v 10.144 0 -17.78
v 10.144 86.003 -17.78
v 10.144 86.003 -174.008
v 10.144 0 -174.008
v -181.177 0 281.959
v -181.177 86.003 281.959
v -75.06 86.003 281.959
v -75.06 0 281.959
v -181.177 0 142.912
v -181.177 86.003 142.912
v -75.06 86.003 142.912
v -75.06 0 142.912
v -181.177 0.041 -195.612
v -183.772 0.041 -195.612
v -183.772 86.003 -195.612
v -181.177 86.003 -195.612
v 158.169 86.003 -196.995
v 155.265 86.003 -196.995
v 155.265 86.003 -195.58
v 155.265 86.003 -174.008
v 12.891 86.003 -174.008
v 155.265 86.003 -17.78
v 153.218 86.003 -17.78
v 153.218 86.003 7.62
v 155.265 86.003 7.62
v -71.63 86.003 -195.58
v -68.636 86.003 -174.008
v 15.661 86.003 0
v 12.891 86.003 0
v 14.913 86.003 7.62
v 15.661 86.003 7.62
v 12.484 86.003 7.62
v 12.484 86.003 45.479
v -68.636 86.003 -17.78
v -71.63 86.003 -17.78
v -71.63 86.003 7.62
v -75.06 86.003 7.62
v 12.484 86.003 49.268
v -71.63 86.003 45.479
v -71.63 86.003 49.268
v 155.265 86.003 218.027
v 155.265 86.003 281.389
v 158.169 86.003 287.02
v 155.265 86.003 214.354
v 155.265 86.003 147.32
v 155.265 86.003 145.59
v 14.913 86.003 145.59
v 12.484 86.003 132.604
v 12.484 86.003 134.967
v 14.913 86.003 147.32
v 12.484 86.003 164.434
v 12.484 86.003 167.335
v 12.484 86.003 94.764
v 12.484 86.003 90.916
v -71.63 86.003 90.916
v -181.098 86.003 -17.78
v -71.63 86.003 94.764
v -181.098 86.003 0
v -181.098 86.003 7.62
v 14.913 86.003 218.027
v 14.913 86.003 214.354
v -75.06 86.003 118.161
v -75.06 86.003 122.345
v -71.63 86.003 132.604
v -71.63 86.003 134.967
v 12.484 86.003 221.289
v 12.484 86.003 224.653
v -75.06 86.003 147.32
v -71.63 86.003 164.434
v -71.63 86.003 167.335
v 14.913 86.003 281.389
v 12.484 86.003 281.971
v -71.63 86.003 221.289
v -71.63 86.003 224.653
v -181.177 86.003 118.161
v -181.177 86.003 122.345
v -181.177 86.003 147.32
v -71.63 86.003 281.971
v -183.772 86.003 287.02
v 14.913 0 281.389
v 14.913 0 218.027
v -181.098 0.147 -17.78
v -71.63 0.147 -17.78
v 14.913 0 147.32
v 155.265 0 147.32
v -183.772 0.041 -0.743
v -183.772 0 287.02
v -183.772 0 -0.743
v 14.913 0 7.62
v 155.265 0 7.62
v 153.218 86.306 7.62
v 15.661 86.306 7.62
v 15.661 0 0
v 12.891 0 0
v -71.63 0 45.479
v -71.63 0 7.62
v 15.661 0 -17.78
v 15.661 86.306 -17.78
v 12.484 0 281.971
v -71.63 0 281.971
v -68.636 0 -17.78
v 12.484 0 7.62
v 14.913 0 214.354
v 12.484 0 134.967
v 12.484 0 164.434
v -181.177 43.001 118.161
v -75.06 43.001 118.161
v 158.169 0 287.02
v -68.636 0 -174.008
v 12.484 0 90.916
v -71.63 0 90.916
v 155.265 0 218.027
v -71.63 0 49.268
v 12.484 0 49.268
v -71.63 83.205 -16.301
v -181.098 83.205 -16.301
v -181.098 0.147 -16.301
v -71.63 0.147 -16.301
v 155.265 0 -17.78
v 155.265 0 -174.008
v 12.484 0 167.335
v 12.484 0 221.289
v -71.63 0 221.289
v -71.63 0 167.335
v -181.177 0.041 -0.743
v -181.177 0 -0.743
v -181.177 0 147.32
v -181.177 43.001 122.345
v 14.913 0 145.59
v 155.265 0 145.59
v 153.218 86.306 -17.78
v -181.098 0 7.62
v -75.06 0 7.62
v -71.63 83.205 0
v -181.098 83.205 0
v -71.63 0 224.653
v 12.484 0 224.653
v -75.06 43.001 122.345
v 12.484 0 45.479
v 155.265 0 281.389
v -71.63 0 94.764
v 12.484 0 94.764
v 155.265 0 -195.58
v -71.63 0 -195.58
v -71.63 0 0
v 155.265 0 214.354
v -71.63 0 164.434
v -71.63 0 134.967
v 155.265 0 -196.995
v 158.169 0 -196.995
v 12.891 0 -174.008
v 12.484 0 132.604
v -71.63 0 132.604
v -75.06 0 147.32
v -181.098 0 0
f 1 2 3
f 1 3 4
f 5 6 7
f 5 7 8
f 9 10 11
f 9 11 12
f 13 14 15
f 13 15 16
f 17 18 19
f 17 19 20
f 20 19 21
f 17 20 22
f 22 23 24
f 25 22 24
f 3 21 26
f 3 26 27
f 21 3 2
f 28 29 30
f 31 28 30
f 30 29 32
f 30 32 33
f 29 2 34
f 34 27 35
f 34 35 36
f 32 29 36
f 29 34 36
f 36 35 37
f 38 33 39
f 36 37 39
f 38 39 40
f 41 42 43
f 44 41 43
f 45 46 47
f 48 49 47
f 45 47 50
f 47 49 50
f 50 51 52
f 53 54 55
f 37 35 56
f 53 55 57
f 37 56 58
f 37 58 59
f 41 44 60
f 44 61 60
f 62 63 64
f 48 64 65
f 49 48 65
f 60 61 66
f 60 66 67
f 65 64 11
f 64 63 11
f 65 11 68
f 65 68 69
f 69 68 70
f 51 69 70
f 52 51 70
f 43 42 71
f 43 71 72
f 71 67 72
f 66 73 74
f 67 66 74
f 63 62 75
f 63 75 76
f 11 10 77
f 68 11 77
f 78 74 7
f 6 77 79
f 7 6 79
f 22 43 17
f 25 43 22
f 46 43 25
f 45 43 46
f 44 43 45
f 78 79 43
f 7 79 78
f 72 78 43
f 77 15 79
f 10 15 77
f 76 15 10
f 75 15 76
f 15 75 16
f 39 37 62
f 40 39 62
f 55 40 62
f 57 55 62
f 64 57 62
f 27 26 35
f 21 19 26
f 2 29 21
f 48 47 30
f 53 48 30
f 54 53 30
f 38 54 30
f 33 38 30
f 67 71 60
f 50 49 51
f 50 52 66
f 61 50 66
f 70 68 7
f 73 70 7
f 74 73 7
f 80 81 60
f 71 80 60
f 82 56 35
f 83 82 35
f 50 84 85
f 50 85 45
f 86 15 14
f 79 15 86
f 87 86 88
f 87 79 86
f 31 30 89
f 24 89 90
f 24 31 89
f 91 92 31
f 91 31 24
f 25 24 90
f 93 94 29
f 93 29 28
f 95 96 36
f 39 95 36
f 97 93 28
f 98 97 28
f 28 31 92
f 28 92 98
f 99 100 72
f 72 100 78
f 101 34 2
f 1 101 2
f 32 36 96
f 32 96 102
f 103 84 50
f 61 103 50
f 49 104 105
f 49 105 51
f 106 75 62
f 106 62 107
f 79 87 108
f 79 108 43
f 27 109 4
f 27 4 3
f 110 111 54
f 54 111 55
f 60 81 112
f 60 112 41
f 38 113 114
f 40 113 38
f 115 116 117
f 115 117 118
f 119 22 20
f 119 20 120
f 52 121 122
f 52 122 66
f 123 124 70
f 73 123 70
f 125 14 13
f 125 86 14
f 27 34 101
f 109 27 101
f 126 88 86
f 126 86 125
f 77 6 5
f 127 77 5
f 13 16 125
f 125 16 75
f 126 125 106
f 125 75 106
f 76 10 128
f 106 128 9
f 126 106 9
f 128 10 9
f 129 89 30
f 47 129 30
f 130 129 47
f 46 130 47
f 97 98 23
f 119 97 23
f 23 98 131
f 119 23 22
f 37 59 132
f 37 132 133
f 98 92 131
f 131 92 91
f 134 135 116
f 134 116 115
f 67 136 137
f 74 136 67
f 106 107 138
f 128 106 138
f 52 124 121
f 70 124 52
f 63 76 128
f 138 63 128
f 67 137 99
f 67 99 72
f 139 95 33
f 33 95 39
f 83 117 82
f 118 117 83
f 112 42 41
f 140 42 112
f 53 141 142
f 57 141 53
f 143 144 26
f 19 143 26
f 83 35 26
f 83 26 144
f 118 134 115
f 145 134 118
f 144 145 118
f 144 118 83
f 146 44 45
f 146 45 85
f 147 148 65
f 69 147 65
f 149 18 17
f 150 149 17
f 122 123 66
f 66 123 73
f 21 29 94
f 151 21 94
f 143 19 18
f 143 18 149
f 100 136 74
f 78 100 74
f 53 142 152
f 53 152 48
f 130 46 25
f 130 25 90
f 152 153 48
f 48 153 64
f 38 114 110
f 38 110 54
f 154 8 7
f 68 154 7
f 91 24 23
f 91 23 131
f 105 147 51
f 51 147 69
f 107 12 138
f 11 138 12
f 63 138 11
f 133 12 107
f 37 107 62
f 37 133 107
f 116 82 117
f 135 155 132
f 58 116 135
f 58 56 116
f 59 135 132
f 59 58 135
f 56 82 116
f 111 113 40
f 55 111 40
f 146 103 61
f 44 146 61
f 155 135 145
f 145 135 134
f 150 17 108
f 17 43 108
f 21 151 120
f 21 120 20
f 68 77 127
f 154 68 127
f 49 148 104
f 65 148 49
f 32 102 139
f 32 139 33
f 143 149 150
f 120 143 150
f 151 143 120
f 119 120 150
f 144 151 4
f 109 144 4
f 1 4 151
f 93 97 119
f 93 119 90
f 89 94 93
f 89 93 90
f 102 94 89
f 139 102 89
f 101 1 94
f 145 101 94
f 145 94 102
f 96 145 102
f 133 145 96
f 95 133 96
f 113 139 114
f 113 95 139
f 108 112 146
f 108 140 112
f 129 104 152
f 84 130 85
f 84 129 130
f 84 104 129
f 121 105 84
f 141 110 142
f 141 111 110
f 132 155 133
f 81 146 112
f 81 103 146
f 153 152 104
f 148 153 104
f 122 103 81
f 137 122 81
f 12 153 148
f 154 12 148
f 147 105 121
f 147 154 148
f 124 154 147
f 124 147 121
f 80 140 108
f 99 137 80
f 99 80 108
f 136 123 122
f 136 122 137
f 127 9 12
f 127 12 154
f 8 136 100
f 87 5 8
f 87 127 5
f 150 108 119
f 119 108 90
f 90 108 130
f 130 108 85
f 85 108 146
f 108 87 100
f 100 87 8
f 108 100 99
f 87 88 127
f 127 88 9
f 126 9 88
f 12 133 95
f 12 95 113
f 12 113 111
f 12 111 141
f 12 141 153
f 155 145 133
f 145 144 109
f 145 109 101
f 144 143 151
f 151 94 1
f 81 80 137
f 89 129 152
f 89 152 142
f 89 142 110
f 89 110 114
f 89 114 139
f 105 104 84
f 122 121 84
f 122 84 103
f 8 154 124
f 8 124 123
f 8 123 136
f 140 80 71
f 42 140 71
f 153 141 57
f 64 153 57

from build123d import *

# Parameters (mm, degrees)
F0_W      = 337.0173126459
F0_H      = 86.0028490424
F1_DEPTH  = 7.62
F2_W      = 3.4302696586
F2_H      = 86.0028490424
F3_DEPTH  = 279.4
F4_W      = 86.0028490424
F4_H      = 4.4084019136
F5_DEPTH  = 108.712
F6_W      = 43.0014245212
F6_H      = 4.1845664382
F7_DEPTH  = 108.712
F8_W      = 86.0028490424
F8_H      = 5.0613901806
F9_DEPTH  = 108.712
F10_W     = 2.5949749823
F10_H     = 86.0028490424
F11_DEPTH = 282.702
F12_W     = 84.5208009705
F12_H     = 86.0028490424
F13_DEPTH = 25.4
F14_W     = 2.429779619
F14_H     = 86.0028490424
F15_DEPTH = 279.4
F16_W     = 86.0028490424
F16_H     = 5.0492010307
F17_DEPTH = 84.836
F18_W     = 86.0028490424
F18_H     = 2.9006898403
F19_DEPTH = 84.836
F20_W     = 86.0028490424
F20_H     = 3.3634305
F21_DEPTH = 85.09
F22_W     = 86.0028490424
F22_H     = 2.3629367352
F23_DEPTH = 85.09
F24_W     = 86.0028490424
F24_H     = 3.8478970528
F25_DEPTH = 85.09
F26_W     = 86.0028490424
F26_H     = 3.7884193933
F27_DEPTH = 85.09
F29_W     = 137.556899339
F29_H     = 86.3062888384
F30_DEPTH = 25.4
F31_W     = 86.0028490424
F31_H     = 1.7304397297
F32_DEPTH = 143.256
F33_W     = 86.0028490424
F33_H     = 5.6310913754
F34_DEPTH = 143.256
F35_W     = 2.9041429413
F35_H     = 86.0028490424
F36_DEPTH = 300.5836
F37_W     = 86.0028490424
F37_H     = 3.6729436779
F38_DEPTH = 141.732
F39_W     = 109.4675436616
F39_H     = 2.797678113
F40_DEPTH = 17.78
F41_W     = 2.5949749823
F41_H     = 2.8018429875
F42_DEPTH = 17.0688
F43_DEPTH = 83.1596
F44_W     = 109.4675436616
F44_H     = 1.4792491037
F45_DEPTH = 83.058
F46_DEPTH = 177.8
F47_W     = 2.9938668013
F47_H     = 86.0028490424
F48_DEPTH = 177.8
F49_W     = 2.7467114851
F49_H     = 86.0028490424
F50_DEPTH = 177.8
F51_DEPTH = 17.78
F52_W     = 2.9041429413
F52_H     = 86.0028490424
F53_DEPTH = 177.8
F54_W     = 86.0028490424
F54_H     = 21.5720179844
F55_DEPTH = 226.06


with BuildPart() as f1:
    # F0 (on Top) → F1 (new body)
    with BuildSketch(Plane.XY):
        with Locations((-12.588955462, 43.0014245212)):
            Rectangle(F0_W, F0_H)
    extrude(amount=F1_DEPTH)

    # F2 (on face) → F3 (join)
    with BuildSketch(Plane.XY.offset(7.62)):
        with Locations((-73.3452029526, 43.0014245212)):
            Rectangle(F2_W, F2_H)
    extrude(amount=F3_DEPTH)

    # F4 (on face) → F5 (join)
    with BuildSketch(Plane(origin=(-75.0603377819, 0, 0), x_dir=(0, -1, 0), z_dir=(-1, 0, 0))):
        with Locations((-43.0014245212, 145.1157990432)):
            Rectangle(F4_W, F4_H)
    extrude(amount=F5_DEPTH)

    # F6 (on face) → F7 (join)
    with BuildSketch(Plane(origin=(-75.0603377819, 0, 0), x_dir=(0, -1, 0), z_dir=(-1, 0, 0))):
        with Locations((-64.5021367818, 120.2528215945)):
            Rectangle(F6_W, F6_H)
    extrude(amount=F7_DEPTH)

    # F8 (on face) → F9 (join)
    with BuildSketch(Plane(origin=(-75.0603377819, 0, 0), x_dir=(0, -1, 0), z_dir=(-1, 0, 0))):
        with Locations((-43.0014245212, 284.4893049097)):
            Rectangle(F8_W, F8_H)
    extrude(amount=F9_DEPTH)

    # F10 (on face) → F11 (join)
    with BuildSketch(Plane(origin=(0, 0, 281.9586098194), x_dir=(1, 0, 0), z_dir=(0, 0, -1))):
        with Locations((-182.4748502908, -43.0014245212)):
            Rectangle(F10_W, F10_H)
    extrude(amount=F11_DEPTH)

    # F12 (on face) → F13 (join)
    with BuildSketch(Plane.XY.offset(7.62)):
        with Locations((-29.3696676381, 43.0014245212)):
            Rectangle(F12_W, F12_H)
    extrude(amount=-F13_DEPTH)

    # F14 (on face) → F15 (join)
    with BuildSketch(Plane.XY.offset(7.62)):
        with Locations((13.6984353885, 43.0014245212)):
            Rectangle(F14_W, F14_H)
    extrude(amount=F15_DEPTH)

    # F16 (on face) → F17 (join)
    with BuildSketch(Plane.YZ.offset(-71.6300681233)):
        with Locations((43.0014245212, 284.4953994846)):
            Rectangle(F16_W, F16_H)
    extrude(amount=F17_DEPTH)

    # F18 (on face) → F19 (join)
    with BuildSketch(Plane.YZ.offset(-71.6300681233)):
        with Locations((43.0014245212, 165.8845096827)):
            Rectangle(F18_W, F18_H)
    extrude(amount=F19_DEPTH)

    # F20 (on face) → F21 (join)
    with BuildSketch(Plane.YZ.offset(-71.6300681233)):
        with Locations((43.0014245212, 222.971111536)):
            Rectangle(F20_W, F20_H)
    extrude(amount=F21_DEPTH)

    # F22 (on face) → F23 (join)
    with BuildSketch(Plane.YZ.offset(-71.6300681233)):
        with Locations((43.0014245212, 133.7857097387)):
            Rectangle(F22_W, F22_H)
    extrude(amount=F23_DEPTH)

    # F24 (on face) → F25 (join)
    with BuildSketch(Plane.YZ.offset(-71.6300681233)):
        with Locations((43.0014245212, 92.8397625685)):
            Rectangle(F24_W, F24_H)
    extrude(amount=F25_DEPTH)

    # F26 (on face) → F27 (join)
    with BuildSketch(Plane.YZ.offset(-71.6300681233)):
        with Locations((43.0014245212, 47.3736973244)):
            Rectangle(F26_W, F26_H)
    extrude(amount=F27_DEPTH)

    # F29 (on face) → F30 (join)
    with BuildSketch(Plane.XY.offset(7.62)):
        with Locations((84.4397153705, 43.1531444192)):
            Rectangle(F29_W, F29_H)
    extrude(amount=-F30_DEPTH)

    # F31 (on face) → F32 (join)
    with BuildSketch(Plane.YZ.offset(14.913325198)):
        with Locations((43.0014245212, 146.4547801352)):
            Rectangle(F31_W, F31_H)
    extrude(amount=F32_DEPTH)

    # F33 (on face) → F34 (join)
    with BuildSketch(Plane.YZ.offset(14.913325198)):
        with Locations((43.0014245212, 284.2044543123)):
            Rectangle(F33_W, F33_H)
    extrude(amount=F34_DEPTH)

    # F35 (on face) → F36 (join)
    with BuildSketch(Plane(origin=(0, 0, 281.3889086246), x_dir=(1, 0, 0), z_dir=(0, 0, -1))):
        with Locations((156.7172537273, -43.0014245212)):
            Rectangle(F35_W, F35_H)
    extrude(amount=F36_DEPTH)

    # F37 (on face) → F38 (join)
    with BuildSketch(Plane.YZ.offset(14.913325198)):
        with Locations((43.0014245212, 216.1909261513)):
            Rectangle(F37_W, F37_H)
    extrude(amount=F38_DEPTH)

    # F39 (on face) → F40 (join)
    with BuildSketch(Plane(origin=(0, 0, 0), x_dir=(1, 0, 0), z_dir=(0, 0, -1))):
        with Locations((-126.3638399541, -84.6040099859)):
            Rectangle(F39_W, F39_H)
    extrude(amount=F40_DEPTH)

    # F41 (on face) → F42 (join)
    with BuildSketch(Plane(origin=(0, 0, -0.7433901806), x_dir=(1, 0, 0), z_dir=(0, 0, -1))):
        with Locations((-182.4748502908, -84.6019275486)):
            Rectangle(F41_W, F41_H)
    extrude(amount=F42_DEPTH)

    # F43 (add): a face of the model
    f43_faces = [f1.faces().sort_by_distance(p)[0] for p in [
        (-182.4748502908, 83.2010060549, -9.2777901806),
    ]]
    extrude(f43_faces, amount=F43_DEPTH)

    # F44 (on face) → F45 (join)
    with BuildSketch(Plane.XZ.offset(-83.2051709294)):
        with Locations((-126.3638399541, -17.0403754482)):
            Rectangle(F44_W, F44_H)
    extrude(amount=F45_DEPTH)

    # F46 (add): a face of the model
    f46_faces = [f1.faces().sort_by_distance(p)[0] for p in [
        (-182.4748502908, 43.0221275486, -17.8121901806),
    ]]
    extrude(f46_faces, amount=F46_DEPTH)

    # F47 (on face) → F48 (join)
    with BuildSketch(Plane(origin=(0, 0, -17.78), x_dir=(1, 0, 0), z_dir=(0, 0, -1))):
        with Locations((-70.1331347227, -43.0014245212)):
            Rectangle(F47_W, F47_H)
    extrude(amount=F48_DEPTH)

    # F49 (on face) → F50 (join)
    with BuildSketch(Plane(origin=(0, 0, -17.78), x_dir=(1, 0, 0), z_dir=(0, 0, -1))):
        with Locations((11.5173771046, -43.0014245212)):
            Rectangle(F49_W, F49_H)
    extrude(amount=F50_DEPTH)

    # F51 (add): a face of the model
    f51_faces = [f1.faces().sort_by_distance(p)[0] for p in [
        (154.2416736484, 43.0014245212, 0),
    ]]
    extrude(f51_faces, amount=F51_DEPTH)

    # F52 (on face) → F53 (join)
    with BuildSketch(Plane(origin=(0, 0, -19.1946913754), x_dir=(1, 0, 0), z_dir=(0, 0, -1))):
        with Locations((156.7172537273, -43.0014245212)):
            Rectangle(F52_W, F52_H)
    extrude(amount=F53_DEPTH)

    # F54 (on face) → F55 (join)
    with BuildSketch(Plane.YZ.offset(-68.6362013221)):
        with Locations((43.0014245212, -184.7939910078)):
            Rectangle(F54_W, F54_H)
    extrude(amount=F55_DEPTH)


solid = f1.part
